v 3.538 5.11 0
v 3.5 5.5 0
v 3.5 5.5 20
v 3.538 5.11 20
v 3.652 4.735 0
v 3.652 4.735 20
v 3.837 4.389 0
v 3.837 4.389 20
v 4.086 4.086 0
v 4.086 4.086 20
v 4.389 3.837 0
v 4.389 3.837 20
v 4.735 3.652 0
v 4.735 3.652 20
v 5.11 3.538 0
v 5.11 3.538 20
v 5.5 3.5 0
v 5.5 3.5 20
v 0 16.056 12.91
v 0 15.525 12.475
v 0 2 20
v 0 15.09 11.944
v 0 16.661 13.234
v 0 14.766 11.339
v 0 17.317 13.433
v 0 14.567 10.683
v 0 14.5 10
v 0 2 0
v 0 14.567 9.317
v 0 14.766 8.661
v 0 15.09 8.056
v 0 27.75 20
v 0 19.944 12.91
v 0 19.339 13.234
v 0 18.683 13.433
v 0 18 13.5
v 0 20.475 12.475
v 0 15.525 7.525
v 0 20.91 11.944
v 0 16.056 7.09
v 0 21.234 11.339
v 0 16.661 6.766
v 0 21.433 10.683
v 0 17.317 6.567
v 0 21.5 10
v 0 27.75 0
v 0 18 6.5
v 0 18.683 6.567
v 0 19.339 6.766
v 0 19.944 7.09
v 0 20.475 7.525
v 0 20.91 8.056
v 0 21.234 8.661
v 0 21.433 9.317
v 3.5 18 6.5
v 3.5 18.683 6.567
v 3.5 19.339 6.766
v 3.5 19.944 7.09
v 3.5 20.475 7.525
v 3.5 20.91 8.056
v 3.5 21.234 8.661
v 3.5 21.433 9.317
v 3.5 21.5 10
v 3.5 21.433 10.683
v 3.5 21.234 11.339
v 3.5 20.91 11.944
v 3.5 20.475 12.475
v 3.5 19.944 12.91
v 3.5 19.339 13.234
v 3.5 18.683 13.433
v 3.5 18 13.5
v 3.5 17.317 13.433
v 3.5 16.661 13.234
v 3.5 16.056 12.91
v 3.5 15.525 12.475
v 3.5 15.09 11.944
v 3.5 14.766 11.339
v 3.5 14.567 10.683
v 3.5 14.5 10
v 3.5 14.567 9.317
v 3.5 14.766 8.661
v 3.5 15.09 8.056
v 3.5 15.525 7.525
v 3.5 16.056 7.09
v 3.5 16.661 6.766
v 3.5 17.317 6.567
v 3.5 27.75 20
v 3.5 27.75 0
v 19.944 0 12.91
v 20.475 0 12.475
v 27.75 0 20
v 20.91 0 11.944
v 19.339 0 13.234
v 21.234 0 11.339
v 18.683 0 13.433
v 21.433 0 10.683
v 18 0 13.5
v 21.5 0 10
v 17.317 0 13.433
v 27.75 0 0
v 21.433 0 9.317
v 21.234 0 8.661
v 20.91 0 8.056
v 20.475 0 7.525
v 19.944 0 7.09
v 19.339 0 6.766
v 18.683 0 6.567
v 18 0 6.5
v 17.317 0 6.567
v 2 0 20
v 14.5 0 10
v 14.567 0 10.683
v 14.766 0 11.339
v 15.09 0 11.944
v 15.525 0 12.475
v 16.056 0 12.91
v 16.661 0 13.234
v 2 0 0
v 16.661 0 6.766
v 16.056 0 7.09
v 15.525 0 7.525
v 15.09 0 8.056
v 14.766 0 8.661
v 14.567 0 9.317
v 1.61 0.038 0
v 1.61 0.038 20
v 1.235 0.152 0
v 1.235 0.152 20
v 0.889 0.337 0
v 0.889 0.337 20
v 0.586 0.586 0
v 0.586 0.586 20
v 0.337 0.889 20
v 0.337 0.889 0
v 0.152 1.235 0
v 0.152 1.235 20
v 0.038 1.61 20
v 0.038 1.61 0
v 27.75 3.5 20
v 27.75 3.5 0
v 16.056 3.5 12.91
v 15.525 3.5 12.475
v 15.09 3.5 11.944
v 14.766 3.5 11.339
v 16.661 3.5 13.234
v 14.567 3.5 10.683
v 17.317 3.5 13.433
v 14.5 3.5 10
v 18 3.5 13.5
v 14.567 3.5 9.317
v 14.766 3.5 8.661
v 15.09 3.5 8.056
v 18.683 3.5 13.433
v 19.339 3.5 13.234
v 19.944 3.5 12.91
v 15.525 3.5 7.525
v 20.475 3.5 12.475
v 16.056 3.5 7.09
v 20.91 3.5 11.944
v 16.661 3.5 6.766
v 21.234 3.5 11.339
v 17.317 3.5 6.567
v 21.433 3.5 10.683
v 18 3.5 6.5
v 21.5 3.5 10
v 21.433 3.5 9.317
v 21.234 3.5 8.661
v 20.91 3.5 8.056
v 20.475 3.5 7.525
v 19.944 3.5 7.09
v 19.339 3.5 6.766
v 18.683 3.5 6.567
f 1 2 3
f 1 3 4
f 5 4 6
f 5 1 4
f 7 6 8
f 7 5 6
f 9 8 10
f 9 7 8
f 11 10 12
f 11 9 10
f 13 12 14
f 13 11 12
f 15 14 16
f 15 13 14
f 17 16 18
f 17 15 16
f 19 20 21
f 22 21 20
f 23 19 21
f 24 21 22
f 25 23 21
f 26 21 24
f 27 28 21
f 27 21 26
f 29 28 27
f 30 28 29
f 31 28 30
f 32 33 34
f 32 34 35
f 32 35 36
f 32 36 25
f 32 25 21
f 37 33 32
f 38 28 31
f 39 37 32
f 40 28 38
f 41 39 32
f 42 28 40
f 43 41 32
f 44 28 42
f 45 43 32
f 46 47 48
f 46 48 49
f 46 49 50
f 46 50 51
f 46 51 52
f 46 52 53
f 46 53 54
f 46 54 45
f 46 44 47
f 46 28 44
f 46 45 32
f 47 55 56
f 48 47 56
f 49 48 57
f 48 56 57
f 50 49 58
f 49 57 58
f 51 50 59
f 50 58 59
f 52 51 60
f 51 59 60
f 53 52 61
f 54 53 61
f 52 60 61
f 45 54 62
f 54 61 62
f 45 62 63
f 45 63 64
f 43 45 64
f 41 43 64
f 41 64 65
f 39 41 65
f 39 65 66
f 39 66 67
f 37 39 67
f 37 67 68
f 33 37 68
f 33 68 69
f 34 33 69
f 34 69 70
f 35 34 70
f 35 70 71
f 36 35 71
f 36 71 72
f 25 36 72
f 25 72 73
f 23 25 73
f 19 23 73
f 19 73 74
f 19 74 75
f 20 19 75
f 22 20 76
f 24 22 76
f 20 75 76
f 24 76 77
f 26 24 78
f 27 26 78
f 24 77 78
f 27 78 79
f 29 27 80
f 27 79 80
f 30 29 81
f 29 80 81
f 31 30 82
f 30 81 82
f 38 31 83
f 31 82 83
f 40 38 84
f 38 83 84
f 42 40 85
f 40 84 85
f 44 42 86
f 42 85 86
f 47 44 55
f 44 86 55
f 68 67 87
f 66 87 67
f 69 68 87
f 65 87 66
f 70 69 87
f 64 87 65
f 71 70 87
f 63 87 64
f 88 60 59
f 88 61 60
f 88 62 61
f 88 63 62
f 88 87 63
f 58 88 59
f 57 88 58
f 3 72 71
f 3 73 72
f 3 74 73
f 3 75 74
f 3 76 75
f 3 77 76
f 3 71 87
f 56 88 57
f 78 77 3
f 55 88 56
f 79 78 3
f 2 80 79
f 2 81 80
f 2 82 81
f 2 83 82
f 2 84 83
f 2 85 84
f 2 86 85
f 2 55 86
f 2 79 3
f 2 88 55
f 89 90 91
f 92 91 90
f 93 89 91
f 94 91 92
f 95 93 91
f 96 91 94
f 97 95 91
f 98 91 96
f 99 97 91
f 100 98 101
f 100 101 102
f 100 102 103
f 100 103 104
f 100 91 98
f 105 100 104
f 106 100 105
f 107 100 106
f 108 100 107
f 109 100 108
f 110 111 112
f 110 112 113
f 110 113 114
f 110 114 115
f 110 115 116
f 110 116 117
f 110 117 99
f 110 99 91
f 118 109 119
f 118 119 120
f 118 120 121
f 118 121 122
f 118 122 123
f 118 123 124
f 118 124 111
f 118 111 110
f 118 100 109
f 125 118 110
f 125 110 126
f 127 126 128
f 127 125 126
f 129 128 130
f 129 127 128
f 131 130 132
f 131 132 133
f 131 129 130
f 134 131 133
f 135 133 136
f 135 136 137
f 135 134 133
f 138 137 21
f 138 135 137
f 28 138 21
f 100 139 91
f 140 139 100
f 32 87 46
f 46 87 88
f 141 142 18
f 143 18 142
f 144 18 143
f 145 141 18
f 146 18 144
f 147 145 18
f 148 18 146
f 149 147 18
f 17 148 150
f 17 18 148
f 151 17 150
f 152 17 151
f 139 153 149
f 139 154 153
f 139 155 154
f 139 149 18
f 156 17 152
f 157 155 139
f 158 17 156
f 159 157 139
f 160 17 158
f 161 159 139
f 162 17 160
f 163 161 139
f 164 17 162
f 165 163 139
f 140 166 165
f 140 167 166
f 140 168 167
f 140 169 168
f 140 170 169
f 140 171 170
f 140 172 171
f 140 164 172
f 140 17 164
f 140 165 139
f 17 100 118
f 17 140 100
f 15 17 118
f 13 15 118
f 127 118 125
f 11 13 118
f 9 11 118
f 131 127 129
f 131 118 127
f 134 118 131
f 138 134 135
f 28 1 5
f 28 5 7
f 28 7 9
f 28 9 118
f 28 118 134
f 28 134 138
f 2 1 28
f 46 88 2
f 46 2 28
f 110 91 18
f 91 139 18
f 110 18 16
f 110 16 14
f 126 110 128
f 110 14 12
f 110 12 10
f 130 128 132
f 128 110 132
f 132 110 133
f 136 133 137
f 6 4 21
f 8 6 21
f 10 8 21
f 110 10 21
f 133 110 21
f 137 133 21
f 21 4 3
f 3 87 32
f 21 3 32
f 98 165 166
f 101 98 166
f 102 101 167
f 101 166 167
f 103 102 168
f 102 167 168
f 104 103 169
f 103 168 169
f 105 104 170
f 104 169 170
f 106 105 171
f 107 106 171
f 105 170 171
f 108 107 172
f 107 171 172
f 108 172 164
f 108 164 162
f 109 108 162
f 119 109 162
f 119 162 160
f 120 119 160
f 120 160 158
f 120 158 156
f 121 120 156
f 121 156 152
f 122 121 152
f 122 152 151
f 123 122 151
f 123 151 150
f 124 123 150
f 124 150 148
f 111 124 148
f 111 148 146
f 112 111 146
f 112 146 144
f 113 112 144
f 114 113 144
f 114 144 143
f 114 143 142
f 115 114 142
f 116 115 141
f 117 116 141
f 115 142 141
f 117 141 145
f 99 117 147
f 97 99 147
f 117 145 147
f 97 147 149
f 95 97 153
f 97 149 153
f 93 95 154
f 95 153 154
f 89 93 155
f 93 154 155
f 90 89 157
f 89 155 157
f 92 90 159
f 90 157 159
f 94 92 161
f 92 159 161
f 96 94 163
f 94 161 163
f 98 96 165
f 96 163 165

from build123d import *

# Parameters (mm, degrees)
BOSS_EXTRUDE1_DEPTH = 20
SKETCH2_R           = 3.5
CUT_EXTRUDE1_DEPTH  = 4.5
SKETCH3_R           = 3.5
CUT_EXTRUDE2_DEPTH  = 4.5
SKETCH4_W           = 22.25
SKETCH4_H           = 20
CUT_EXTRUDE3_DEPTH  = 4.5
SKETCH5_W           = 20
SKETCH5_H           = 22.25
CUT_EXTRUDE4_DEPTH  = 4.5


with BuildPart() as part:
    # Sketch1 → Boss-Extrude1 (new body)
    with BuildSketch(Plane.XY):
        with BuildLine():
            Line((0, 2), (0, 50))
            Line((0, 50), (3.5, 50))
            Line((3.5, 50), (3.5, 5.5))
            ThreePointArc((3.5, 5.5), (4.085786438, 4.085786438), (5.5, 3.5))
            Line((5.5, 3.5), (50, 3.5))
            Line((50, 3.5), (50, 0))
            Line((50, 0), (2, 0))
            ThreePointArc((2, 0), (0.585786438, 0.585786438), (0, 2))
        make_face()
    extrude(amount=BOSS_EXTRUDE1_DEPTH)

    # Sketch2 → Cut-Extrude1 (cut, through all)
    with BuildSketch(Plane(origin=(0, 3.5, 0), x_dir=(1, 0, 0), z_dir=(0, 1, 0))):
        with Locations((38, -10)):
            Circle(SKETCH2_R)
        with Locations((18, -10)):
            Circle(SKETCH2_R)
    extrude(amount=-CUT_EXTRUDE1_DEPTH, mode=Mode.SUBTRACT)

    # Sketch3 → Cut-Extrude2 (cut, through all)
    with BuildSketch(Plane(origin=(3.5, 0, 0), x_dir=(0, 0, -1), z_dir=(1, 0, 0))):
        with Locations((-10, 38)):
            Circle(SKETCH3_R)
        with Locations((-10, 18)):
            Circle(SKETCH3_R)
    extrude(amount=-CUT_EXTRUDE2_DEPTH, mode=Mode.SUBTRACT)

    # Sketch4 → Cut-Extrude3 (cut, through all)
    with BuildSketch(Plane(origin=(0, 3.5, 0), x_dir=(1, 0, 0), z_dir=(0, 1, 0))):
        with Locations((38.875, -10)):
            Rectangle(SKETCH4_W, SKETCH4_H)
    extrude(amount=-CUT_EXTRUDE3_DEPTH, mode=Mode.SUBTRACT)

    # Sketch5 → Cut-Extrude4 (cut, through all)
    with BuildSketch(Plane(origin=(3.5, 0, 0), x_dir=(0, 0, -1), z_dir=(1, 0, 0))):
        with Locations((-10, 38.875)):
            Rectangle(SKETCH5_W, SKETCH5_H)
    extrude(amount=-CUT_EXTRUDE4_DEPTH, mode=Mode.SUBTRACT)


solid = part.part
